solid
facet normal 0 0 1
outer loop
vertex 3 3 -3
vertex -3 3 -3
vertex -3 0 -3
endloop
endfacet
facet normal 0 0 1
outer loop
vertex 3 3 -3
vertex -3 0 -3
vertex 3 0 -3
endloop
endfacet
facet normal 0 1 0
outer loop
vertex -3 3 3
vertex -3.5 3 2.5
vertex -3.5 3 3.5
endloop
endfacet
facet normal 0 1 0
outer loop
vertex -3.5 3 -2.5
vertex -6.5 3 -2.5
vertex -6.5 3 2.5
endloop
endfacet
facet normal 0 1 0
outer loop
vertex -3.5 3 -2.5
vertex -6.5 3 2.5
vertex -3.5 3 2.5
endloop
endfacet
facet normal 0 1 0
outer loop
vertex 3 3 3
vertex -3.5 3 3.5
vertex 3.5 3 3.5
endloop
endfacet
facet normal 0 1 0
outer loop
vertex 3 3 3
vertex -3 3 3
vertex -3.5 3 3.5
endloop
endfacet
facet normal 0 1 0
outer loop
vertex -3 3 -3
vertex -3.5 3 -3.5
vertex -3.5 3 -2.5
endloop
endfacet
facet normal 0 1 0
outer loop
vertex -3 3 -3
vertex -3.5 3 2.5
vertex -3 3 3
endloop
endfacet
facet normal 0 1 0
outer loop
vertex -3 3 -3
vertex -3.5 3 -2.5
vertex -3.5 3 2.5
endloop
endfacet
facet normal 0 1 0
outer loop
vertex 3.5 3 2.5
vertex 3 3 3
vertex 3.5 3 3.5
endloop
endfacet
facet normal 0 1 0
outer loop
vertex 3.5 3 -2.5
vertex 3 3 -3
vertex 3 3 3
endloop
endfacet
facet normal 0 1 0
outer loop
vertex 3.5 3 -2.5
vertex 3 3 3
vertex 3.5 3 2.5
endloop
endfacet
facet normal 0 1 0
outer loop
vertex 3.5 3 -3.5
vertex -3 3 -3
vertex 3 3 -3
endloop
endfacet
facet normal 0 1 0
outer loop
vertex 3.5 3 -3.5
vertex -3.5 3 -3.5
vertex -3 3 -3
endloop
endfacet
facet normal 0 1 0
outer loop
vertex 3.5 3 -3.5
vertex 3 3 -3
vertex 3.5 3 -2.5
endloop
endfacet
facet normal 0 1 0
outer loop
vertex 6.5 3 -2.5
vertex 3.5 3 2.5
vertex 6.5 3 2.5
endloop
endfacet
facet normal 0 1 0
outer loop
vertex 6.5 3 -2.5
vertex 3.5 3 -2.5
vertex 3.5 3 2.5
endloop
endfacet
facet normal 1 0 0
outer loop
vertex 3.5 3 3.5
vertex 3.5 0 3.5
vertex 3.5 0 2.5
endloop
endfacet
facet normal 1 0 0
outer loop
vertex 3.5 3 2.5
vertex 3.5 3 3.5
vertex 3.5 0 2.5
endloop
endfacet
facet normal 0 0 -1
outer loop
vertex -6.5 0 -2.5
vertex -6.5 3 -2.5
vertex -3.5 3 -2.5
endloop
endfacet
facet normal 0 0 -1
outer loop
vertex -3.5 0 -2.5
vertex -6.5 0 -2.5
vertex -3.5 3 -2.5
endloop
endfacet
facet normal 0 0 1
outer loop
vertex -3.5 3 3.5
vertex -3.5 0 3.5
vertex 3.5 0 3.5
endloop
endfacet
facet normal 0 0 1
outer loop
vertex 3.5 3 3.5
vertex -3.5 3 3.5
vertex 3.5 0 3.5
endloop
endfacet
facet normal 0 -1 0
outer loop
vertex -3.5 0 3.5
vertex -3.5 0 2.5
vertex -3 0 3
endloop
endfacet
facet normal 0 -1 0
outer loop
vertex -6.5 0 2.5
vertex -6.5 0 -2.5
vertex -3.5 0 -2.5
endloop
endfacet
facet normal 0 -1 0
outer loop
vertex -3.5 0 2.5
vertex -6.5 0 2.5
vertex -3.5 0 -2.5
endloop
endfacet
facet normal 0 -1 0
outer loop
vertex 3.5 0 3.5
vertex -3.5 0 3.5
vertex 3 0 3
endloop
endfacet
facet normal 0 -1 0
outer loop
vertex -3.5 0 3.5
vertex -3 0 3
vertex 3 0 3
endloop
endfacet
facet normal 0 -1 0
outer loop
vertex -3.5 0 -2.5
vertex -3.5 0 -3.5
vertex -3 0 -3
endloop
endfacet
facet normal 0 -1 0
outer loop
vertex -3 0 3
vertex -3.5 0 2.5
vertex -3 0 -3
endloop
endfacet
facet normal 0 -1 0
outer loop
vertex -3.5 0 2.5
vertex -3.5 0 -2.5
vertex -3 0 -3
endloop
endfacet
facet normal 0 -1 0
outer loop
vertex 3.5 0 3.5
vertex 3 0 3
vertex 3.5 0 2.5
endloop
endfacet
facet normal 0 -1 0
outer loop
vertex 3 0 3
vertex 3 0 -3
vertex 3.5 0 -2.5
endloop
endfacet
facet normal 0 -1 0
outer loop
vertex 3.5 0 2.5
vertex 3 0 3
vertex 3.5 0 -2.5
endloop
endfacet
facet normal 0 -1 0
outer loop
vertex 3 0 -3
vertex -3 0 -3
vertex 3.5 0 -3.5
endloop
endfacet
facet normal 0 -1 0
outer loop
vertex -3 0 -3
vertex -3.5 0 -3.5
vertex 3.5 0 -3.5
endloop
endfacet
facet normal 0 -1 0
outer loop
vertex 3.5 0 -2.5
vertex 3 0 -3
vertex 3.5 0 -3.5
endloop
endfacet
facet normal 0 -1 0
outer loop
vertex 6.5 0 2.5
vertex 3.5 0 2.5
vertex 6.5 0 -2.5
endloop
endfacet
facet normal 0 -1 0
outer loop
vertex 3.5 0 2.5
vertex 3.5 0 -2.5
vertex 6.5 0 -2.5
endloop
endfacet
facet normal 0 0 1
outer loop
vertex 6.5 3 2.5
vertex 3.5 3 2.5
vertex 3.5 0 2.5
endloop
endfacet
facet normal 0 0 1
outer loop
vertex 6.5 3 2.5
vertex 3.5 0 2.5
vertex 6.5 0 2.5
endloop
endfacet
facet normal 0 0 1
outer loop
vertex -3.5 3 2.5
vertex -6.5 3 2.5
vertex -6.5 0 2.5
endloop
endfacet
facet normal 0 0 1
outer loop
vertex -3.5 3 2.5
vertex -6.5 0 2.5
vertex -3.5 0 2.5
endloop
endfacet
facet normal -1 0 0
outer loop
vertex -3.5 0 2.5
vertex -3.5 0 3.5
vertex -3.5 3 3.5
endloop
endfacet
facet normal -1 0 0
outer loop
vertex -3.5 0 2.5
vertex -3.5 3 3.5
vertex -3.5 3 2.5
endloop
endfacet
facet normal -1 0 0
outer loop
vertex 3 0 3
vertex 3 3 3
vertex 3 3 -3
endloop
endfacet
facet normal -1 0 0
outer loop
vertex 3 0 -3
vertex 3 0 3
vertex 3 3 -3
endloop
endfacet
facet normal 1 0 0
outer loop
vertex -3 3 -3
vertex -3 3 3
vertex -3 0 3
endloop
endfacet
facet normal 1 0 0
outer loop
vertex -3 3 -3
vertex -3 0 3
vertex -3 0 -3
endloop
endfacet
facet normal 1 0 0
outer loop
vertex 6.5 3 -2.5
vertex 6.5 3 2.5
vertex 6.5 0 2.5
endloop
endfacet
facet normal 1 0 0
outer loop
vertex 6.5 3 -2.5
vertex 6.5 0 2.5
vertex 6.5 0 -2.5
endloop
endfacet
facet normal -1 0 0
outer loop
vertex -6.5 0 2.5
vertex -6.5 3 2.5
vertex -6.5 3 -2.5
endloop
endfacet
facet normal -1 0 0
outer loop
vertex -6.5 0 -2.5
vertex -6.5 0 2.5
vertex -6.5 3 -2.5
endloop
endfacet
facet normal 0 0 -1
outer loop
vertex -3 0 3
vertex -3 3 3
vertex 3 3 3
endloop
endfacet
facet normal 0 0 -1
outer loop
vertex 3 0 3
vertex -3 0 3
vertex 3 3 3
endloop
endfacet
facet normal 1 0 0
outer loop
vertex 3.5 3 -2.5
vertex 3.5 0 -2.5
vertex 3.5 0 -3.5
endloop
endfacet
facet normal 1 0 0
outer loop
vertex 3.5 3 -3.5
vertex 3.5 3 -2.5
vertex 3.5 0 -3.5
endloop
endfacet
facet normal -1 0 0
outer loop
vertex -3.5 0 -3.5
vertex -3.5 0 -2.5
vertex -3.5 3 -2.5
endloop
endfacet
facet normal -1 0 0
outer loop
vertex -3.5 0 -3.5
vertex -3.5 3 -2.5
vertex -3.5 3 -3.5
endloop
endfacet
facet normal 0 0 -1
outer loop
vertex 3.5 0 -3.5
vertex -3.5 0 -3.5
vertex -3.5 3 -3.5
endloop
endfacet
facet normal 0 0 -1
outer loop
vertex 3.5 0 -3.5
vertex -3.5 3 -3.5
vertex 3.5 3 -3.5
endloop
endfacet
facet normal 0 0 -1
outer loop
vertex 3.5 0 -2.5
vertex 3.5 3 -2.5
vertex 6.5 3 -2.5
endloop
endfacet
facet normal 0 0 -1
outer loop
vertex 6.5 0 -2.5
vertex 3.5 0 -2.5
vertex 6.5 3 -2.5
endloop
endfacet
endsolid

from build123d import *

# Parameters (mm, degrees)
SKETCH1_W           = 7
SKETCH1_H           = 7
BOSS_EXTRUDE1_DEPTH = 3
SKETCH4_W           = 3
SKETCH4_H           = 5
BOSS_EXTRUDE2_DEPTH = 3
SKETCH5_W           = 6
SKETCH5_H           = 6
CUT_EXTRUDE1_DEPTH  = 10


with BuildPart() as part:
    # Sketch1 → Boss-Extrude1 (new body)
    with BuildSketch(Plane(origin=(0, 0, 0), x_dir=(1, 0, 0), z_dir=(0, 1, 0))):
        Rectangle(SKETCH1_W, SKETCH1_H)
    extrude(amount=BOSS_EXTRUDE1_DEPTH)

    # Sketch4 → Boss-Extrude2 (add)
    with BuildSketch(Plane(origin=(0, 3, 0), x_dir=(1, 0, 0), z_dir=(0, 1, 0))):
        with Locations((-5, 0)):
            Rectangle(SKETCH4_W, SKETCH4_H)
        with Locations((5, 0)):
            Rectangle(SKETCH4_W, SKETCH4_H)
    extrude(amount=-BOSS_EXTRUDE2_DEPTH)

    # Sketch5 → Cut-Extrude1 (cut)
    with BuildSketch(Plane(origin=(0, 3, 0), x_dir=(1, 0, 0), z_dir=(0, 1, 0))):
        Rectangle(SKETCH5_W, SKETCH5_H)
    extrude(amount=-CUT_EXTRUDE1_DEPTH, mode=Mode.SUBTRACT)


solid = part.part
